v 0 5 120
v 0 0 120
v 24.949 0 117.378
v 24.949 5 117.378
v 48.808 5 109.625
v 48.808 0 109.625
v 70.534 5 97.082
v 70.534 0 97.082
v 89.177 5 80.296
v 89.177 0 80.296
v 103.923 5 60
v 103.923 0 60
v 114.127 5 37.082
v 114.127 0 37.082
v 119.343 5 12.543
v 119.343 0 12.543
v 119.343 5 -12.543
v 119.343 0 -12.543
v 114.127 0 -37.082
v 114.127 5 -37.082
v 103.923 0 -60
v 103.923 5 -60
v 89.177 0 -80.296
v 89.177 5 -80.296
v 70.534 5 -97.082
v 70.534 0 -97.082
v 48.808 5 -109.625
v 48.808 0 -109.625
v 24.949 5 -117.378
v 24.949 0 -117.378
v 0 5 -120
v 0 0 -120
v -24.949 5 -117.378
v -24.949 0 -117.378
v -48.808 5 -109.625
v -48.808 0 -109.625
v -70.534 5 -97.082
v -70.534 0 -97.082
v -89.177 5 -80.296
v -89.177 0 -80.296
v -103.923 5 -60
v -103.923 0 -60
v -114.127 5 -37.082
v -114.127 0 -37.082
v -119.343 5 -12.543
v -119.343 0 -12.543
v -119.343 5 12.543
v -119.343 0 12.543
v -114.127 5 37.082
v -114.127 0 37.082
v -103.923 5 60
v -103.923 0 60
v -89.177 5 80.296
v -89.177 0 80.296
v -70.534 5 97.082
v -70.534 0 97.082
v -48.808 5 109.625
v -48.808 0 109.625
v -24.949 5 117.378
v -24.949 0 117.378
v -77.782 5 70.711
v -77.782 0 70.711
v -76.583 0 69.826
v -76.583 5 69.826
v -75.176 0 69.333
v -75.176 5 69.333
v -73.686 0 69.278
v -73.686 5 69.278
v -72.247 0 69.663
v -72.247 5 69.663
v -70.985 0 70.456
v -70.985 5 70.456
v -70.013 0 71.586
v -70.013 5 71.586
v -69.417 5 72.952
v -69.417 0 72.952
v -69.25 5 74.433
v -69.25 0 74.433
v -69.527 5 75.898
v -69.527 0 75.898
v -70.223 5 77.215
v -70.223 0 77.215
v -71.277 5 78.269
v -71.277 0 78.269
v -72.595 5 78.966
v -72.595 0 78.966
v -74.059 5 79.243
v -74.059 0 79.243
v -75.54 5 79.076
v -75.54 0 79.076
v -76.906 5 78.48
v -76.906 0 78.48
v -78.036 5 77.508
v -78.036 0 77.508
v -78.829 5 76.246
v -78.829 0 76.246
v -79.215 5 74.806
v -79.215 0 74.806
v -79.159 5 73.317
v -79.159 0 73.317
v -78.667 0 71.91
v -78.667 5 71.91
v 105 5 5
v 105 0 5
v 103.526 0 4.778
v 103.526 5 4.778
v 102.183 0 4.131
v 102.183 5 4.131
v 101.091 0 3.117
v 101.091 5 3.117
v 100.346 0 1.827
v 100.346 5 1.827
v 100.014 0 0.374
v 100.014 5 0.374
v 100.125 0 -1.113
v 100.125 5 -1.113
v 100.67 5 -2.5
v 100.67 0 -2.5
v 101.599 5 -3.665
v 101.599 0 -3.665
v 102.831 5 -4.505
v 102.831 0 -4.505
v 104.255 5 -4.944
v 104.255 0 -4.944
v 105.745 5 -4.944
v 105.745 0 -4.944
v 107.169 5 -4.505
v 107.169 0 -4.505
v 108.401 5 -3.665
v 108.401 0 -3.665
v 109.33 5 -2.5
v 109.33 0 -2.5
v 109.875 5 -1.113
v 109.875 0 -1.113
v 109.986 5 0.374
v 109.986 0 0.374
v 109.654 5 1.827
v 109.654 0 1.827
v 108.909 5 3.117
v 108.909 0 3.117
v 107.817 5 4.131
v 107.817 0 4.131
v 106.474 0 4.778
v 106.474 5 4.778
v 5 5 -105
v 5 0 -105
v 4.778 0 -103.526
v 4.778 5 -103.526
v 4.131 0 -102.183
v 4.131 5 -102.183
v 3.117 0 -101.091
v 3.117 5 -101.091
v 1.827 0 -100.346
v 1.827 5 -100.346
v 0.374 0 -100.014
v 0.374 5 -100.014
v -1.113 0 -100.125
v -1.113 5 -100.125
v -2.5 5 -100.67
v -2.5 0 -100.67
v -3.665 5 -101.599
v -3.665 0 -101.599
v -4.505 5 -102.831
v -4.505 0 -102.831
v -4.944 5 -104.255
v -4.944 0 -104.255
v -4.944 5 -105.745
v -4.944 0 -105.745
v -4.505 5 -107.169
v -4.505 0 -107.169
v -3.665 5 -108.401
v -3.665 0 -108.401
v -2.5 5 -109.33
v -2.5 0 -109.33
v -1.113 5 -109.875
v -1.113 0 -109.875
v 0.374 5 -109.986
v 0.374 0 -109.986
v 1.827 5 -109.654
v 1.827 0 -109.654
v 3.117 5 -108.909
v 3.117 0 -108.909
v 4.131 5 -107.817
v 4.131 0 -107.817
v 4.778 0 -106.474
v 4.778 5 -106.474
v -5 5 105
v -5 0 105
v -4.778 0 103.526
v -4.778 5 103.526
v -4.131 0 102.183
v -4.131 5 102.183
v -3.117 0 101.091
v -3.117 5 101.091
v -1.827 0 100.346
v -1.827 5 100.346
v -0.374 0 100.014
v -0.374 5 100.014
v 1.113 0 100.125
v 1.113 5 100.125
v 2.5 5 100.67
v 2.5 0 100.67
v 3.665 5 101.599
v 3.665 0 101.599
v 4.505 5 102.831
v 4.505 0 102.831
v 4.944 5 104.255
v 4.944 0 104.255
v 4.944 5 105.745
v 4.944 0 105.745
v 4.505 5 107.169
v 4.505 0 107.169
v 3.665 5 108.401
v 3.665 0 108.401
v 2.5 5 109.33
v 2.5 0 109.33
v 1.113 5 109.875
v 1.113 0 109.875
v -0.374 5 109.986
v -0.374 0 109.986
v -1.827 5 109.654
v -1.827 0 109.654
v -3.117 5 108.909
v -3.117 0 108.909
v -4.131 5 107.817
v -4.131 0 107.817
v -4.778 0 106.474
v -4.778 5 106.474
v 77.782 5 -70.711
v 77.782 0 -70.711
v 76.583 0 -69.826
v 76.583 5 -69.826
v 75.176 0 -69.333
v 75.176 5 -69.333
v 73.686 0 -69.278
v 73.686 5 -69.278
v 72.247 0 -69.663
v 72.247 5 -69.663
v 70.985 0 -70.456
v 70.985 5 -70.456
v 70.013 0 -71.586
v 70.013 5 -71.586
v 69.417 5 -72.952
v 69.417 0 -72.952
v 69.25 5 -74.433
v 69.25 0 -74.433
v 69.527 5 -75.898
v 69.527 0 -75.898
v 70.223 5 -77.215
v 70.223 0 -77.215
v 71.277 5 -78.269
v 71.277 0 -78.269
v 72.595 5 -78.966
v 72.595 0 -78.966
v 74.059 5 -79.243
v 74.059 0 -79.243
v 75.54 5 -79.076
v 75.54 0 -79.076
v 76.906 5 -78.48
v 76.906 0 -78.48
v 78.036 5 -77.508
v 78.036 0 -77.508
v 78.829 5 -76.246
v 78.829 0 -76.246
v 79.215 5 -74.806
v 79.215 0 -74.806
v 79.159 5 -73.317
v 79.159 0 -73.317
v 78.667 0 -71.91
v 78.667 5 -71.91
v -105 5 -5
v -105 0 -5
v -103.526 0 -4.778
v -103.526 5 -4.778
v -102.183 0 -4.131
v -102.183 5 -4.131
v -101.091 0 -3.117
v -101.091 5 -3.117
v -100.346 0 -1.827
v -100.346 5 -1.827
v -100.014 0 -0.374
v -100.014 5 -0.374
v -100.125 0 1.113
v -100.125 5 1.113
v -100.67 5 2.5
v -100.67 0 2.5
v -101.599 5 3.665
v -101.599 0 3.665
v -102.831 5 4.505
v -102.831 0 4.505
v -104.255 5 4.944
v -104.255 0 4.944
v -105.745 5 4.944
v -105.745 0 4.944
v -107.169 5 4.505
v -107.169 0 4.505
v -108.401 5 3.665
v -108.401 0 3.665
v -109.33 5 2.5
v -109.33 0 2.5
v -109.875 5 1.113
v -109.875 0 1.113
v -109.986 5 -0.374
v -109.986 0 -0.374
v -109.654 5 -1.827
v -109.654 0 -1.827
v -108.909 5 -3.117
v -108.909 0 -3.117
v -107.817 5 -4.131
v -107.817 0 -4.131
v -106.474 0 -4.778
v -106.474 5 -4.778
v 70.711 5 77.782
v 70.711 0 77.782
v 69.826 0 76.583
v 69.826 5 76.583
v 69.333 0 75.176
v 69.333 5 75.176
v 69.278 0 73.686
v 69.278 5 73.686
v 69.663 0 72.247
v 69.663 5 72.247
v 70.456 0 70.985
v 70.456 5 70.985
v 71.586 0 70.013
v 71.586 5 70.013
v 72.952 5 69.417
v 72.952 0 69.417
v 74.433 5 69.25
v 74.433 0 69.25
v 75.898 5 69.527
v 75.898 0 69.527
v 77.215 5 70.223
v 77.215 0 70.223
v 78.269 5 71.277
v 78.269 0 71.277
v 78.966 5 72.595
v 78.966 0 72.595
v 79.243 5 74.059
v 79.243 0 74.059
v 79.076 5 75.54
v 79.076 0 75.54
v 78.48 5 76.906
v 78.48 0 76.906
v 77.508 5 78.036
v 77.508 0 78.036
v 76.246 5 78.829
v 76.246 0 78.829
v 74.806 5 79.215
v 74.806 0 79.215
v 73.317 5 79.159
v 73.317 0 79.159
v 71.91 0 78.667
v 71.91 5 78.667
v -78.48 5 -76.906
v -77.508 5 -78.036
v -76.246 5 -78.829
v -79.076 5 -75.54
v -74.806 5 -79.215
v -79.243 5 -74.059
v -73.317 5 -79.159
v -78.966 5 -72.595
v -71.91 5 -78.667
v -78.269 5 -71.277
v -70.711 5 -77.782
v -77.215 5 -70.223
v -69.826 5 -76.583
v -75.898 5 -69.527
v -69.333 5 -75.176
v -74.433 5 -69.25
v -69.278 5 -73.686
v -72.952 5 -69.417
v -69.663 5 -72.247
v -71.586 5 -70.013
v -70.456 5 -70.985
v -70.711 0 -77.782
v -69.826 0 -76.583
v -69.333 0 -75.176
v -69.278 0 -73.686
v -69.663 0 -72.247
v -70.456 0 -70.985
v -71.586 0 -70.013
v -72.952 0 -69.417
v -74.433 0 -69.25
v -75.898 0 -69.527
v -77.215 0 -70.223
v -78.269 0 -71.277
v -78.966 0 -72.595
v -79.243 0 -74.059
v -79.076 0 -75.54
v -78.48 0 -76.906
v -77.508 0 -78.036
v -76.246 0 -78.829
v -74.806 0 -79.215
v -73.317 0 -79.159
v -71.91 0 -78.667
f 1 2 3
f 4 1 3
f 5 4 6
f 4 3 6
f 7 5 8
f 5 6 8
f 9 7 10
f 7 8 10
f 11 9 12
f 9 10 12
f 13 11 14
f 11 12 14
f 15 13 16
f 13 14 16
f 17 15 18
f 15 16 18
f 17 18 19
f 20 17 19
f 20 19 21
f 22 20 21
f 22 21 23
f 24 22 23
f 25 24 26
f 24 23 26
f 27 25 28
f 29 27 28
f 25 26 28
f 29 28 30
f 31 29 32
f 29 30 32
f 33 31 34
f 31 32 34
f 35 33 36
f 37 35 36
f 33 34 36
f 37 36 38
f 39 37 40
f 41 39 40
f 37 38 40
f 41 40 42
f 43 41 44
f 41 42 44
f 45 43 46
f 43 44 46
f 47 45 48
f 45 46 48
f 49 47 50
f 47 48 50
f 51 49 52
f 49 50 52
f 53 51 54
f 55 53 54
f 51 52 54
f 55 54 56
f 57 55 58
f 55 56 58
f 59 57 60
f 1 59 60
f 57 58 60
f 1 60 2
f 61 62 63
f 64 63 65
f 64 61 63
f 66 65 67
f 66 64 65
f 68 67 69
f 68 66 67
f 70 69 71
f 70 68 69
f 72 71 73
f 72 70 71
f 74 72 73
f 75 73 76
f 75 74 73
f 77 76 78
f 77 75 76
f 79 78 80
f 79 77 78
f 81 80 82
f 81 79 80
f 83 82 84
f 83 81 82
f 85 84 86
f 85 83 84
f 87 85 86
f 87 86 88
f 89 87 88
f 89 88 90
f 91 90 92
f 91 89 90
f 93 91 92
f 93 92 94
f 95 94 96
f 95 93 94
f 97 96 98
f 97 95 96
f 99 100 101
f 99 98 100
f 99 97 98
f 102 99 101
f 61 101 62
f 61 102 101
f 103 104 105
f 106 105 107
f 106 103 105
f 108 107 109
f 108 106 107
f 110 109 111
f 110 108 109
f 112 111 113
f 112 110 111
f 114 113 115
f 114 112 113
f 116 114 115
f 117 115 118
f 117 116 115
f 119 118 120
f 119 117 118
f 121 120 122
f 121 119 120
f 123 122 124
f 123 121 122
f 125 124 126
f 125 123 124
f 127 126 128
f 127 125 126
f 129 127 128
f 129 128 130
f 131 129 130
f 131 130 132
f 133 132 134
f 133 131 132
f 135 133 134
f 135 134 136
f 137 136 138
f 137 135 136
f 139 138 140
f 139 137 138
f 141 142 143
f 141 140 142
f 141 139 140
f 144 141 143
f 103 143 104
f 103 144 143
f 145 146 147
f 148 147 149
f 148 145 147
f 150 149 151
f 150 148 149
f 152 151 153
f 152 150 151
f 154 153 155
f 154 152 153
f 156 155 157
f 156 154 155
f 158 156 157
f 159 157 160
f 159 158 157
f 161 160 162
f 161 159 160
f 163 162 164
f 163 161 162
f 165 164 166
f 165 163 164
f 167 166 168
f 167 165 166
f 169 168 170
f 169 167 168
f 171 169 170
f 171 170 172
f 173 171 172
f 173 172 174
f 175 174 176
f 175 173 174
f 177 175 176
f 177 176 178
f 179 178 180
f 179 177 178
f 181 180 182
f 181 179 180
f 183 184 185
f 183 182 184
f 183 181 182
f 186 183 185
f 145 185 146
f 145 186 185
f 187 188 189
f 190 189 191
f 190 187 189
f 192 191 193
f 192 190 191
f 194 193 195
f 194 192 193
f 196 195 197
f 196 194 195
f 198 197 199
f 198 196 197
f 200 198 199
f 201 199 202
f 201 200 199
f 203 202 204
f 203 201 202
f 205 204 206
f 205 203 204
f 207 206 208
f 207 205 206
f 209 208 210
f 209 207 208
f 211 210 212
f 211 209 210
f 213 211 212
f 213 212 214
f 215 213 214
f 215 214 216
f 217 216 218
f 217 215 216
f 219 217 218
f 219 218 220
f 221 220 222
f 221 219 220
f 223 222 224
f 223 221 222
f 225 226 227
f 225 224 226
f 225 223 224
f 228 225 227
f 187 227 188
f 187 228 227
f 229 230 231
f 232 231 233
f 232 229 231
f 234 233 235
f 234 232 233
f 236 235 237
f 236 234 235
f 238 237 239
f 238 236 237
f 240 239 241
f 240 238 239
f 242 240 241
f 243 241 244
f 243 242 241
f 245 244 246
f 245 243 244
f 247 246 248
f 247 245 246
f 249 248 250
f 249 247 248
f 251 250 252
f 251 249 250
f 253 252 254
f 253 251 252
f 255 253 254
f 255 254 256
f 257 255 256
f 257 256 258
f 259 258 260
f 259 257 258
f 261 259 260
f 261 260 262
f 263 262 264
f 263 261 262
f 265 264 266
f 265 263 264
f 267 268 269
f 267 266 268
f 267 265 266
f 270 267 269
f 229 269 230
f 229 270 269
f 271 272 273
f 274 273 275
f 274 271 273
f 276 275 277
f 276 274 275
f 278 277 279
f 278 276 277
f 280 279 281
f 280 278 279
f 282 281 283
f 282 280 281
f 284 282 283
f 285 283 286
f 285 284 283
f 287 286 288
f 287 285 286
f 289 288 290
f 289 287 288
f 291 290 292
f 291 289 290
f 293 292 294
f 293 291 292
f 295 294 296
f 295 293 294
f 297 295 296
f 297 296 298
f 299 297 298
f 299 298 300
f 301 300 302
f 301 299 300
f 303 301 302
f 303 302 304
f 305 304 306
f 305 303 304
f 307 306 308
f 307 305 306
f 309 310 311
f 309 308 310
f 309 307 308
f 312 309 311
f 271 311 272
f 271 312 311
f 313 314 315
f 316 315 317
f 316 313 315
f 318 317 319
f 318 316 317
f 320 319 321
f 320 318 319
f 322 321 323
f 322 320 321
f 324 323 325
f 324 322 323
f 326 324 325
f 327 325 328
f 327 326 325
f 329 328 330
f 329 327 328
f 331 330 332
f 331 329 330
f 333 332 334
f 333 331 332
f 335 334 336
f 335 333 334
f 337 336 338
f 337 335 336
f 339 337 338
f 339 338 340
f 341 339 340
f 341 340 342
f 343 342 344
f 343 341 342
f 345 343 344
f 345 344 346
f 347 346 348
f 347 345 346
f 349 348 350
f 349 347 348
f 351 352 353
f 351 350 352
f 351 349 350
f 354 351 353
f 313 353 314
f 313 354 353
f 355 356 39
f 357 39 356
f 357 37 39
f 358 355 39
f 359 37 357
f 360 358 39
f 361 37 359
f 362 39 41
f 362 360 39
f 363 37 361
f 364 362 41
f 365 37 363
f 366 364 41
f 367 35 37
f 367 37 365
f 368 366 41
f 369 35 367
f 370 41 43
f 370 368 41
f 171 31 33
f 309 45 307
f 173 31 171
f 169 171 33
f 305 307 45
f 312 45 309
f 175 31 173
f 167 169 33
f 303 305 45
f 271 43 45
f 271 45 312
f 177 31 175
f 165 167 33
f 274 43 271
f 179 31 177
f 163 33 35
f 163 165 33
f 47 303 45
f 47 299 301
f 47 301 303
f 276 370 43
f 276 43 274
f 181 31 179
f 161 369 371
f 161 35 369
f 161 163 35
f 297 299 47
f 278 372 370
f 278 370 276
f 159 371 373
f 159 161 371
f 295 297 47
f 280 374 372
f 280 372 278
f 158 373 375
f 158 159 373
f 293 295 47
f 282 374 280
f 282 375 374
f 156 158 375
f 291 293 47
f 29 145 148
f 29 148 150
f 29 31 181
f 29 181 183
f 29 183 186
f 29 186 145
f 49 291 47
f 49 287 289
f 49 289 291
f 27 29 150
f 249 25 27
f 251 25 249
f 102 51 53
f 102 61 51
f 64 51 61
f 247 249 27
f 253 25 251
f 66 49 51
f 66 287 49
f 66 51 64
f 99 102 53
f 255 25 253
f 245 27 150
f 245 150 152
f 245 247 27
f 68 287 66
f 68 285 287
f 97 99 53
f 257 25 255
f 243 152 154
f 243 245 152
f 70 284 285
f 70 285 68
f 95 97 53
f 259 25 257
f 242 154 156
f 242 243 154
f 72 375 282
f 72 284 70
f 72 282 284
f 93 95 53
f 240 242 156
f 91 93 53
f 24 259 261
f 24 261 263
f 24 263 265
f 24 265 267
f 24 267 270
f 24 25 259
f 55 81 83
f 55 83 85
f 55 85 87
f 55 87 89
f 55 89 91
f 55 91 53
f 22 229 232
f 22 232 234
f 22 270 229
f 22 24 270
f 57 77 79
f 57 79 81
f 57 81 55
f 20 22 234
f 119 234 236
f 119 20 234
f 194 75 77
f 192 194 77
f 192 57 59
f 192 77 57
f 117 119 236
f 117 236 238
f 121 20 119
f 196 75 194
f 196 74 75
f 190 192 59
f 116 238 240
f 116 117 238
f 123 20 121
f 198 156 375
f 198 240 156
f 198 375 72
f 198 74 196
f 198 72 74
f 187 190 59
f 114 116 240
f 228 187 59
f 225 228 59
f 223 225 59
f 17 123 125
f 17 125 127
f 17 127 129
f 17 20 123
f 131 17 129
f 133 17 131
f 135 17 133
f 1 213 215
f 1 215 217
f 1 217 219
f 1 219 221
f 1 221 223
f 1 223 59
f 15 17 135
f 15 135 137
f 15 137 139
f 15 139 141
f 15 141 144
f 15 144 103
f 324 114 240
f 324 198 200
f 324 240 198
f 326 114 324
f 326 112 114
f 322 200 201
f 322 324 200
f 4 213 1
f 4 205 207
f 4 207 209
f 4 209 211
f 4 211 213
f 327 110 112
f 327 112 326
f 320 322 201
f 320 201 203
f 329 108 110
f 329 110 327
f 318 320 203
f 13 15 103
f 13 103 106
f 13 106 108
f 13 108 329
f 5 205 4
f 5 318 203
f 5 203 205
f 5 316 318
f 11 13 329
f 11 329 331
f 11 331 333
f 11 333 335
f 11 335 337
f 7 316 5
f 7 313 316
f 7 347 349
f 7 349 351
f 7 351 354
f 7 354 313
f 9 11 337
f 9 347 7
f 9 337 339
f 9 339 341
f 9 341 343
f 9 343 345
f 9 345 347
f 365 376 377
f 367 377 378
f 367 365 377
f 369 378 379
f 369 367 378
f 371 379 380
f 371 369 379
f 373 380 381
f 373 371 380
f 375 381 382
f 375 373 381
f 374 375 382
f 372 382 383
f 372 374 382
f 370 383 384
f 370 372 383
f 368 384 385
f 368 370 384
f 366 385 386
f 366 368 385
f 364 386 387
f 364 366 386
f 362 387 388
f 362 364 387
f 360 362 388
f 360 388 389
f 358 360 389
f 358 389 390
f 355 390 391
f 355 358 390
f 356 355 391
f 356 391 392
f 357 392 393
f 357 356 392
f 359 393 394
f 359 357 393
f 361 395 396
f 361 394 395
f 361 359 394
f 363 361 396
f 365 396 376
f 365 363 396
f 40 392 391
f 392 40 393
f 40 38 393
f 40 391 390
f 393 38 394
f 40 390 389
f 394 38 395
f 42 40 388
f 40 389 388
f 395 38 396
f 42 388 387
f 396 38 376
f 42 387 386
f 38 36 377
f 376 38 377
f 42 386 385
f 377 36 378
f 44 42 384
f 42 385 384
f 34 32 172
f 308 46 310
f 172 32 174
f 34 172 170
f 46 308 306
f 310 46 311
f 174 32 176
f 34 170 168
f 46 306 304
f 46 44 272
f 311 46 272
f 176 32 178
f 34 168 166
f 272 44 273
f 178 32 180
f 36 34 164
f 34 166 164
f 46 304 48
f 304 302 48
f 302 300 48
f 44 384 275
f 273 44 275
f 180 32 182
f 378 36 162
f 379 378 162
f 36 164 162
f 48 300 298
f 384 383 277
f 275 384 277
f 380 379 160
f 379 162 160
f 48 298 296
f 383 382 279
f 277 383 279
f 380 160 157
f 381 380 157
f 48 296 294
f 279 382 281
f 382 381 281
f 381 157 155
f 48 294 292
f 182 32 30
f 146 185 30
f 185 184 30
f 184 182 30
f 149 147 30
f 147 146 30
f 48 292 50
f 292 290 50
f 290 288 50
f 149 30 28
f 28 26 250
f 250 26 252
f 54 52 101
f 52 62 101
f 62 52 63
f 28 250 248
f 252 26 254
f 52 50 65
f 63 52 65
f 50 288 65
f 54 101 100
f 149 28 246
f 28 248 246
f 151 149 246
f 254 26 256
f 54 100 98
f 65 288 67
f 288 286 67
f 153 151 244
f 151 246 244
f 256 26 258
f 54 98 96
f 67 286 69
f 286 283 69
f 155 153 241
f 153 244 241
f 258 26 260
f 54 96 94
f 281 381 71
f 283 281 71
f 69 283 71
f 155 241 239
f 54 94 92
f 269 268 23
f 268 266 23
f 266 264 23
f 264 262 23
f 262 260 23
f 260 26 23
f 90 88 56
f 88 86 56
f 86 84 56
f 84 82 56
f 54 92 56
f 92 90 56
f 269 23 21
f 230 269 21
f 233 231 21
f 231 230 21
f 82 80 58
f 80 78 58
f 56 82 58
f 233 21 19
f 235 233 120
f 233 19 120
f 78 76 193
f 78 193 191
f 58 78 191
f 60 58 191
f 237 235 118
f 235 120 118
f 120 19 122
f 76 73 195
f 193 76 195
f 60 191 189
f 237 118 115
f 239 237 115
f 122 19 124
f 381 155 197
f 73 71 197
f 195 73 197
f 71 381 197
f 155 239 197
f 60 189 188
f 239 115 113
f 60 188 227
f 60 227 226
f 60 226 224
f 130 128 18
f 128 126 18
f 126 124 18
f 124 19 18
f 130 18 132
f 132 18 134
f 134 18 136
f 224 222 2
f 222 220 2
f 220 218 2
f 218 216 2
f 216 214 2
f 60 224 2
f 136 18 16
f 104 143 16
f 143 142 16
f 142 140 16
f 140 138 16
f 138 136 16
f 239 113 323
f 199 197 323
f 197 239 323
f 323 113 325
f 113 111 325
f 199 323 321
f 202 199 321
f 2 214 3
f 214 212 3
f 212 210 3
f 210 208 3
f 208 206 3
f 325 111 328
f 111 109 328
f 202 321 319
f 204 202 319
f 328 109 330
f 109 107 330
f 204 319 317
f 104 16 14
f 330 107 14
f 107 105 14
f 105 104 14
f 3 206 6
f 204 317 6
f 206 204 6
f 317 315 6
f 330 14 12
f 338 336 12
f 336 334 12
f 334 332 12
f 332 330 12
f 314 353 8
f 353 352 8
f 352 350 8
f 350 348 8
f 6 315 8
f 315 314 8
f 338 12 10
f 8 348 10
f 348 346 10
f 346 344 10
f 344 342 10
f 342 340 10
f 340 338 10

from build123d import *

# Parameters (mm, degrees)
SKETCH_9_R               = 120
EXTRUDE_1_DEPTH          = 5
PATTERN_CIRCULAR_1_COUNT = 8


with BuildPart() as part:
    # Эскиз9 → Бобышка-Вытянуть1 (new body)
    with BuildSketch(Plane(origin=(0, 0, 0), x_dir=(1, 0, 0), z_dir=(0, 1, 0))):
        Circle(SKETCH_9_R)
    extrude(amount=EXTRUDE_1_DEPTH)

    # Эскиз13 → Диаметр отверстия Ø10.0 (10)1 (revolve, cut)
    with BuildSketch(Plane(origin=(105, 5, 0), x_dir=(0, 0, 1), z_dir=(1, 0, 0))):
        Polygon((0, 0), (0, 18.004303095), (5, 15), (5, 0), align=None)
    hole_wizard_10_0_10_1 = revolve(axis=Axis((105, 11.35, 0), (0, -1, 0)), mode=Mode.SUBTRACT)

    # Круговой массив1: Диаметр отверстия Ø10.0 (10)1 ×8 about axis
    pattern_circular_1_axis = Axis((0, 50, 0), (0, -1, 0))
    for i in range(1, PATTERN_CIRCULAR_1_COUNT):
        add(hole_wizard_10_0_10_1.rotate(pattern_circular_1_axis, i * 360 / PATTERN_CIRCULAR_1_COUNT), mode=Mode.SUBTRACT)


solid = part.part
